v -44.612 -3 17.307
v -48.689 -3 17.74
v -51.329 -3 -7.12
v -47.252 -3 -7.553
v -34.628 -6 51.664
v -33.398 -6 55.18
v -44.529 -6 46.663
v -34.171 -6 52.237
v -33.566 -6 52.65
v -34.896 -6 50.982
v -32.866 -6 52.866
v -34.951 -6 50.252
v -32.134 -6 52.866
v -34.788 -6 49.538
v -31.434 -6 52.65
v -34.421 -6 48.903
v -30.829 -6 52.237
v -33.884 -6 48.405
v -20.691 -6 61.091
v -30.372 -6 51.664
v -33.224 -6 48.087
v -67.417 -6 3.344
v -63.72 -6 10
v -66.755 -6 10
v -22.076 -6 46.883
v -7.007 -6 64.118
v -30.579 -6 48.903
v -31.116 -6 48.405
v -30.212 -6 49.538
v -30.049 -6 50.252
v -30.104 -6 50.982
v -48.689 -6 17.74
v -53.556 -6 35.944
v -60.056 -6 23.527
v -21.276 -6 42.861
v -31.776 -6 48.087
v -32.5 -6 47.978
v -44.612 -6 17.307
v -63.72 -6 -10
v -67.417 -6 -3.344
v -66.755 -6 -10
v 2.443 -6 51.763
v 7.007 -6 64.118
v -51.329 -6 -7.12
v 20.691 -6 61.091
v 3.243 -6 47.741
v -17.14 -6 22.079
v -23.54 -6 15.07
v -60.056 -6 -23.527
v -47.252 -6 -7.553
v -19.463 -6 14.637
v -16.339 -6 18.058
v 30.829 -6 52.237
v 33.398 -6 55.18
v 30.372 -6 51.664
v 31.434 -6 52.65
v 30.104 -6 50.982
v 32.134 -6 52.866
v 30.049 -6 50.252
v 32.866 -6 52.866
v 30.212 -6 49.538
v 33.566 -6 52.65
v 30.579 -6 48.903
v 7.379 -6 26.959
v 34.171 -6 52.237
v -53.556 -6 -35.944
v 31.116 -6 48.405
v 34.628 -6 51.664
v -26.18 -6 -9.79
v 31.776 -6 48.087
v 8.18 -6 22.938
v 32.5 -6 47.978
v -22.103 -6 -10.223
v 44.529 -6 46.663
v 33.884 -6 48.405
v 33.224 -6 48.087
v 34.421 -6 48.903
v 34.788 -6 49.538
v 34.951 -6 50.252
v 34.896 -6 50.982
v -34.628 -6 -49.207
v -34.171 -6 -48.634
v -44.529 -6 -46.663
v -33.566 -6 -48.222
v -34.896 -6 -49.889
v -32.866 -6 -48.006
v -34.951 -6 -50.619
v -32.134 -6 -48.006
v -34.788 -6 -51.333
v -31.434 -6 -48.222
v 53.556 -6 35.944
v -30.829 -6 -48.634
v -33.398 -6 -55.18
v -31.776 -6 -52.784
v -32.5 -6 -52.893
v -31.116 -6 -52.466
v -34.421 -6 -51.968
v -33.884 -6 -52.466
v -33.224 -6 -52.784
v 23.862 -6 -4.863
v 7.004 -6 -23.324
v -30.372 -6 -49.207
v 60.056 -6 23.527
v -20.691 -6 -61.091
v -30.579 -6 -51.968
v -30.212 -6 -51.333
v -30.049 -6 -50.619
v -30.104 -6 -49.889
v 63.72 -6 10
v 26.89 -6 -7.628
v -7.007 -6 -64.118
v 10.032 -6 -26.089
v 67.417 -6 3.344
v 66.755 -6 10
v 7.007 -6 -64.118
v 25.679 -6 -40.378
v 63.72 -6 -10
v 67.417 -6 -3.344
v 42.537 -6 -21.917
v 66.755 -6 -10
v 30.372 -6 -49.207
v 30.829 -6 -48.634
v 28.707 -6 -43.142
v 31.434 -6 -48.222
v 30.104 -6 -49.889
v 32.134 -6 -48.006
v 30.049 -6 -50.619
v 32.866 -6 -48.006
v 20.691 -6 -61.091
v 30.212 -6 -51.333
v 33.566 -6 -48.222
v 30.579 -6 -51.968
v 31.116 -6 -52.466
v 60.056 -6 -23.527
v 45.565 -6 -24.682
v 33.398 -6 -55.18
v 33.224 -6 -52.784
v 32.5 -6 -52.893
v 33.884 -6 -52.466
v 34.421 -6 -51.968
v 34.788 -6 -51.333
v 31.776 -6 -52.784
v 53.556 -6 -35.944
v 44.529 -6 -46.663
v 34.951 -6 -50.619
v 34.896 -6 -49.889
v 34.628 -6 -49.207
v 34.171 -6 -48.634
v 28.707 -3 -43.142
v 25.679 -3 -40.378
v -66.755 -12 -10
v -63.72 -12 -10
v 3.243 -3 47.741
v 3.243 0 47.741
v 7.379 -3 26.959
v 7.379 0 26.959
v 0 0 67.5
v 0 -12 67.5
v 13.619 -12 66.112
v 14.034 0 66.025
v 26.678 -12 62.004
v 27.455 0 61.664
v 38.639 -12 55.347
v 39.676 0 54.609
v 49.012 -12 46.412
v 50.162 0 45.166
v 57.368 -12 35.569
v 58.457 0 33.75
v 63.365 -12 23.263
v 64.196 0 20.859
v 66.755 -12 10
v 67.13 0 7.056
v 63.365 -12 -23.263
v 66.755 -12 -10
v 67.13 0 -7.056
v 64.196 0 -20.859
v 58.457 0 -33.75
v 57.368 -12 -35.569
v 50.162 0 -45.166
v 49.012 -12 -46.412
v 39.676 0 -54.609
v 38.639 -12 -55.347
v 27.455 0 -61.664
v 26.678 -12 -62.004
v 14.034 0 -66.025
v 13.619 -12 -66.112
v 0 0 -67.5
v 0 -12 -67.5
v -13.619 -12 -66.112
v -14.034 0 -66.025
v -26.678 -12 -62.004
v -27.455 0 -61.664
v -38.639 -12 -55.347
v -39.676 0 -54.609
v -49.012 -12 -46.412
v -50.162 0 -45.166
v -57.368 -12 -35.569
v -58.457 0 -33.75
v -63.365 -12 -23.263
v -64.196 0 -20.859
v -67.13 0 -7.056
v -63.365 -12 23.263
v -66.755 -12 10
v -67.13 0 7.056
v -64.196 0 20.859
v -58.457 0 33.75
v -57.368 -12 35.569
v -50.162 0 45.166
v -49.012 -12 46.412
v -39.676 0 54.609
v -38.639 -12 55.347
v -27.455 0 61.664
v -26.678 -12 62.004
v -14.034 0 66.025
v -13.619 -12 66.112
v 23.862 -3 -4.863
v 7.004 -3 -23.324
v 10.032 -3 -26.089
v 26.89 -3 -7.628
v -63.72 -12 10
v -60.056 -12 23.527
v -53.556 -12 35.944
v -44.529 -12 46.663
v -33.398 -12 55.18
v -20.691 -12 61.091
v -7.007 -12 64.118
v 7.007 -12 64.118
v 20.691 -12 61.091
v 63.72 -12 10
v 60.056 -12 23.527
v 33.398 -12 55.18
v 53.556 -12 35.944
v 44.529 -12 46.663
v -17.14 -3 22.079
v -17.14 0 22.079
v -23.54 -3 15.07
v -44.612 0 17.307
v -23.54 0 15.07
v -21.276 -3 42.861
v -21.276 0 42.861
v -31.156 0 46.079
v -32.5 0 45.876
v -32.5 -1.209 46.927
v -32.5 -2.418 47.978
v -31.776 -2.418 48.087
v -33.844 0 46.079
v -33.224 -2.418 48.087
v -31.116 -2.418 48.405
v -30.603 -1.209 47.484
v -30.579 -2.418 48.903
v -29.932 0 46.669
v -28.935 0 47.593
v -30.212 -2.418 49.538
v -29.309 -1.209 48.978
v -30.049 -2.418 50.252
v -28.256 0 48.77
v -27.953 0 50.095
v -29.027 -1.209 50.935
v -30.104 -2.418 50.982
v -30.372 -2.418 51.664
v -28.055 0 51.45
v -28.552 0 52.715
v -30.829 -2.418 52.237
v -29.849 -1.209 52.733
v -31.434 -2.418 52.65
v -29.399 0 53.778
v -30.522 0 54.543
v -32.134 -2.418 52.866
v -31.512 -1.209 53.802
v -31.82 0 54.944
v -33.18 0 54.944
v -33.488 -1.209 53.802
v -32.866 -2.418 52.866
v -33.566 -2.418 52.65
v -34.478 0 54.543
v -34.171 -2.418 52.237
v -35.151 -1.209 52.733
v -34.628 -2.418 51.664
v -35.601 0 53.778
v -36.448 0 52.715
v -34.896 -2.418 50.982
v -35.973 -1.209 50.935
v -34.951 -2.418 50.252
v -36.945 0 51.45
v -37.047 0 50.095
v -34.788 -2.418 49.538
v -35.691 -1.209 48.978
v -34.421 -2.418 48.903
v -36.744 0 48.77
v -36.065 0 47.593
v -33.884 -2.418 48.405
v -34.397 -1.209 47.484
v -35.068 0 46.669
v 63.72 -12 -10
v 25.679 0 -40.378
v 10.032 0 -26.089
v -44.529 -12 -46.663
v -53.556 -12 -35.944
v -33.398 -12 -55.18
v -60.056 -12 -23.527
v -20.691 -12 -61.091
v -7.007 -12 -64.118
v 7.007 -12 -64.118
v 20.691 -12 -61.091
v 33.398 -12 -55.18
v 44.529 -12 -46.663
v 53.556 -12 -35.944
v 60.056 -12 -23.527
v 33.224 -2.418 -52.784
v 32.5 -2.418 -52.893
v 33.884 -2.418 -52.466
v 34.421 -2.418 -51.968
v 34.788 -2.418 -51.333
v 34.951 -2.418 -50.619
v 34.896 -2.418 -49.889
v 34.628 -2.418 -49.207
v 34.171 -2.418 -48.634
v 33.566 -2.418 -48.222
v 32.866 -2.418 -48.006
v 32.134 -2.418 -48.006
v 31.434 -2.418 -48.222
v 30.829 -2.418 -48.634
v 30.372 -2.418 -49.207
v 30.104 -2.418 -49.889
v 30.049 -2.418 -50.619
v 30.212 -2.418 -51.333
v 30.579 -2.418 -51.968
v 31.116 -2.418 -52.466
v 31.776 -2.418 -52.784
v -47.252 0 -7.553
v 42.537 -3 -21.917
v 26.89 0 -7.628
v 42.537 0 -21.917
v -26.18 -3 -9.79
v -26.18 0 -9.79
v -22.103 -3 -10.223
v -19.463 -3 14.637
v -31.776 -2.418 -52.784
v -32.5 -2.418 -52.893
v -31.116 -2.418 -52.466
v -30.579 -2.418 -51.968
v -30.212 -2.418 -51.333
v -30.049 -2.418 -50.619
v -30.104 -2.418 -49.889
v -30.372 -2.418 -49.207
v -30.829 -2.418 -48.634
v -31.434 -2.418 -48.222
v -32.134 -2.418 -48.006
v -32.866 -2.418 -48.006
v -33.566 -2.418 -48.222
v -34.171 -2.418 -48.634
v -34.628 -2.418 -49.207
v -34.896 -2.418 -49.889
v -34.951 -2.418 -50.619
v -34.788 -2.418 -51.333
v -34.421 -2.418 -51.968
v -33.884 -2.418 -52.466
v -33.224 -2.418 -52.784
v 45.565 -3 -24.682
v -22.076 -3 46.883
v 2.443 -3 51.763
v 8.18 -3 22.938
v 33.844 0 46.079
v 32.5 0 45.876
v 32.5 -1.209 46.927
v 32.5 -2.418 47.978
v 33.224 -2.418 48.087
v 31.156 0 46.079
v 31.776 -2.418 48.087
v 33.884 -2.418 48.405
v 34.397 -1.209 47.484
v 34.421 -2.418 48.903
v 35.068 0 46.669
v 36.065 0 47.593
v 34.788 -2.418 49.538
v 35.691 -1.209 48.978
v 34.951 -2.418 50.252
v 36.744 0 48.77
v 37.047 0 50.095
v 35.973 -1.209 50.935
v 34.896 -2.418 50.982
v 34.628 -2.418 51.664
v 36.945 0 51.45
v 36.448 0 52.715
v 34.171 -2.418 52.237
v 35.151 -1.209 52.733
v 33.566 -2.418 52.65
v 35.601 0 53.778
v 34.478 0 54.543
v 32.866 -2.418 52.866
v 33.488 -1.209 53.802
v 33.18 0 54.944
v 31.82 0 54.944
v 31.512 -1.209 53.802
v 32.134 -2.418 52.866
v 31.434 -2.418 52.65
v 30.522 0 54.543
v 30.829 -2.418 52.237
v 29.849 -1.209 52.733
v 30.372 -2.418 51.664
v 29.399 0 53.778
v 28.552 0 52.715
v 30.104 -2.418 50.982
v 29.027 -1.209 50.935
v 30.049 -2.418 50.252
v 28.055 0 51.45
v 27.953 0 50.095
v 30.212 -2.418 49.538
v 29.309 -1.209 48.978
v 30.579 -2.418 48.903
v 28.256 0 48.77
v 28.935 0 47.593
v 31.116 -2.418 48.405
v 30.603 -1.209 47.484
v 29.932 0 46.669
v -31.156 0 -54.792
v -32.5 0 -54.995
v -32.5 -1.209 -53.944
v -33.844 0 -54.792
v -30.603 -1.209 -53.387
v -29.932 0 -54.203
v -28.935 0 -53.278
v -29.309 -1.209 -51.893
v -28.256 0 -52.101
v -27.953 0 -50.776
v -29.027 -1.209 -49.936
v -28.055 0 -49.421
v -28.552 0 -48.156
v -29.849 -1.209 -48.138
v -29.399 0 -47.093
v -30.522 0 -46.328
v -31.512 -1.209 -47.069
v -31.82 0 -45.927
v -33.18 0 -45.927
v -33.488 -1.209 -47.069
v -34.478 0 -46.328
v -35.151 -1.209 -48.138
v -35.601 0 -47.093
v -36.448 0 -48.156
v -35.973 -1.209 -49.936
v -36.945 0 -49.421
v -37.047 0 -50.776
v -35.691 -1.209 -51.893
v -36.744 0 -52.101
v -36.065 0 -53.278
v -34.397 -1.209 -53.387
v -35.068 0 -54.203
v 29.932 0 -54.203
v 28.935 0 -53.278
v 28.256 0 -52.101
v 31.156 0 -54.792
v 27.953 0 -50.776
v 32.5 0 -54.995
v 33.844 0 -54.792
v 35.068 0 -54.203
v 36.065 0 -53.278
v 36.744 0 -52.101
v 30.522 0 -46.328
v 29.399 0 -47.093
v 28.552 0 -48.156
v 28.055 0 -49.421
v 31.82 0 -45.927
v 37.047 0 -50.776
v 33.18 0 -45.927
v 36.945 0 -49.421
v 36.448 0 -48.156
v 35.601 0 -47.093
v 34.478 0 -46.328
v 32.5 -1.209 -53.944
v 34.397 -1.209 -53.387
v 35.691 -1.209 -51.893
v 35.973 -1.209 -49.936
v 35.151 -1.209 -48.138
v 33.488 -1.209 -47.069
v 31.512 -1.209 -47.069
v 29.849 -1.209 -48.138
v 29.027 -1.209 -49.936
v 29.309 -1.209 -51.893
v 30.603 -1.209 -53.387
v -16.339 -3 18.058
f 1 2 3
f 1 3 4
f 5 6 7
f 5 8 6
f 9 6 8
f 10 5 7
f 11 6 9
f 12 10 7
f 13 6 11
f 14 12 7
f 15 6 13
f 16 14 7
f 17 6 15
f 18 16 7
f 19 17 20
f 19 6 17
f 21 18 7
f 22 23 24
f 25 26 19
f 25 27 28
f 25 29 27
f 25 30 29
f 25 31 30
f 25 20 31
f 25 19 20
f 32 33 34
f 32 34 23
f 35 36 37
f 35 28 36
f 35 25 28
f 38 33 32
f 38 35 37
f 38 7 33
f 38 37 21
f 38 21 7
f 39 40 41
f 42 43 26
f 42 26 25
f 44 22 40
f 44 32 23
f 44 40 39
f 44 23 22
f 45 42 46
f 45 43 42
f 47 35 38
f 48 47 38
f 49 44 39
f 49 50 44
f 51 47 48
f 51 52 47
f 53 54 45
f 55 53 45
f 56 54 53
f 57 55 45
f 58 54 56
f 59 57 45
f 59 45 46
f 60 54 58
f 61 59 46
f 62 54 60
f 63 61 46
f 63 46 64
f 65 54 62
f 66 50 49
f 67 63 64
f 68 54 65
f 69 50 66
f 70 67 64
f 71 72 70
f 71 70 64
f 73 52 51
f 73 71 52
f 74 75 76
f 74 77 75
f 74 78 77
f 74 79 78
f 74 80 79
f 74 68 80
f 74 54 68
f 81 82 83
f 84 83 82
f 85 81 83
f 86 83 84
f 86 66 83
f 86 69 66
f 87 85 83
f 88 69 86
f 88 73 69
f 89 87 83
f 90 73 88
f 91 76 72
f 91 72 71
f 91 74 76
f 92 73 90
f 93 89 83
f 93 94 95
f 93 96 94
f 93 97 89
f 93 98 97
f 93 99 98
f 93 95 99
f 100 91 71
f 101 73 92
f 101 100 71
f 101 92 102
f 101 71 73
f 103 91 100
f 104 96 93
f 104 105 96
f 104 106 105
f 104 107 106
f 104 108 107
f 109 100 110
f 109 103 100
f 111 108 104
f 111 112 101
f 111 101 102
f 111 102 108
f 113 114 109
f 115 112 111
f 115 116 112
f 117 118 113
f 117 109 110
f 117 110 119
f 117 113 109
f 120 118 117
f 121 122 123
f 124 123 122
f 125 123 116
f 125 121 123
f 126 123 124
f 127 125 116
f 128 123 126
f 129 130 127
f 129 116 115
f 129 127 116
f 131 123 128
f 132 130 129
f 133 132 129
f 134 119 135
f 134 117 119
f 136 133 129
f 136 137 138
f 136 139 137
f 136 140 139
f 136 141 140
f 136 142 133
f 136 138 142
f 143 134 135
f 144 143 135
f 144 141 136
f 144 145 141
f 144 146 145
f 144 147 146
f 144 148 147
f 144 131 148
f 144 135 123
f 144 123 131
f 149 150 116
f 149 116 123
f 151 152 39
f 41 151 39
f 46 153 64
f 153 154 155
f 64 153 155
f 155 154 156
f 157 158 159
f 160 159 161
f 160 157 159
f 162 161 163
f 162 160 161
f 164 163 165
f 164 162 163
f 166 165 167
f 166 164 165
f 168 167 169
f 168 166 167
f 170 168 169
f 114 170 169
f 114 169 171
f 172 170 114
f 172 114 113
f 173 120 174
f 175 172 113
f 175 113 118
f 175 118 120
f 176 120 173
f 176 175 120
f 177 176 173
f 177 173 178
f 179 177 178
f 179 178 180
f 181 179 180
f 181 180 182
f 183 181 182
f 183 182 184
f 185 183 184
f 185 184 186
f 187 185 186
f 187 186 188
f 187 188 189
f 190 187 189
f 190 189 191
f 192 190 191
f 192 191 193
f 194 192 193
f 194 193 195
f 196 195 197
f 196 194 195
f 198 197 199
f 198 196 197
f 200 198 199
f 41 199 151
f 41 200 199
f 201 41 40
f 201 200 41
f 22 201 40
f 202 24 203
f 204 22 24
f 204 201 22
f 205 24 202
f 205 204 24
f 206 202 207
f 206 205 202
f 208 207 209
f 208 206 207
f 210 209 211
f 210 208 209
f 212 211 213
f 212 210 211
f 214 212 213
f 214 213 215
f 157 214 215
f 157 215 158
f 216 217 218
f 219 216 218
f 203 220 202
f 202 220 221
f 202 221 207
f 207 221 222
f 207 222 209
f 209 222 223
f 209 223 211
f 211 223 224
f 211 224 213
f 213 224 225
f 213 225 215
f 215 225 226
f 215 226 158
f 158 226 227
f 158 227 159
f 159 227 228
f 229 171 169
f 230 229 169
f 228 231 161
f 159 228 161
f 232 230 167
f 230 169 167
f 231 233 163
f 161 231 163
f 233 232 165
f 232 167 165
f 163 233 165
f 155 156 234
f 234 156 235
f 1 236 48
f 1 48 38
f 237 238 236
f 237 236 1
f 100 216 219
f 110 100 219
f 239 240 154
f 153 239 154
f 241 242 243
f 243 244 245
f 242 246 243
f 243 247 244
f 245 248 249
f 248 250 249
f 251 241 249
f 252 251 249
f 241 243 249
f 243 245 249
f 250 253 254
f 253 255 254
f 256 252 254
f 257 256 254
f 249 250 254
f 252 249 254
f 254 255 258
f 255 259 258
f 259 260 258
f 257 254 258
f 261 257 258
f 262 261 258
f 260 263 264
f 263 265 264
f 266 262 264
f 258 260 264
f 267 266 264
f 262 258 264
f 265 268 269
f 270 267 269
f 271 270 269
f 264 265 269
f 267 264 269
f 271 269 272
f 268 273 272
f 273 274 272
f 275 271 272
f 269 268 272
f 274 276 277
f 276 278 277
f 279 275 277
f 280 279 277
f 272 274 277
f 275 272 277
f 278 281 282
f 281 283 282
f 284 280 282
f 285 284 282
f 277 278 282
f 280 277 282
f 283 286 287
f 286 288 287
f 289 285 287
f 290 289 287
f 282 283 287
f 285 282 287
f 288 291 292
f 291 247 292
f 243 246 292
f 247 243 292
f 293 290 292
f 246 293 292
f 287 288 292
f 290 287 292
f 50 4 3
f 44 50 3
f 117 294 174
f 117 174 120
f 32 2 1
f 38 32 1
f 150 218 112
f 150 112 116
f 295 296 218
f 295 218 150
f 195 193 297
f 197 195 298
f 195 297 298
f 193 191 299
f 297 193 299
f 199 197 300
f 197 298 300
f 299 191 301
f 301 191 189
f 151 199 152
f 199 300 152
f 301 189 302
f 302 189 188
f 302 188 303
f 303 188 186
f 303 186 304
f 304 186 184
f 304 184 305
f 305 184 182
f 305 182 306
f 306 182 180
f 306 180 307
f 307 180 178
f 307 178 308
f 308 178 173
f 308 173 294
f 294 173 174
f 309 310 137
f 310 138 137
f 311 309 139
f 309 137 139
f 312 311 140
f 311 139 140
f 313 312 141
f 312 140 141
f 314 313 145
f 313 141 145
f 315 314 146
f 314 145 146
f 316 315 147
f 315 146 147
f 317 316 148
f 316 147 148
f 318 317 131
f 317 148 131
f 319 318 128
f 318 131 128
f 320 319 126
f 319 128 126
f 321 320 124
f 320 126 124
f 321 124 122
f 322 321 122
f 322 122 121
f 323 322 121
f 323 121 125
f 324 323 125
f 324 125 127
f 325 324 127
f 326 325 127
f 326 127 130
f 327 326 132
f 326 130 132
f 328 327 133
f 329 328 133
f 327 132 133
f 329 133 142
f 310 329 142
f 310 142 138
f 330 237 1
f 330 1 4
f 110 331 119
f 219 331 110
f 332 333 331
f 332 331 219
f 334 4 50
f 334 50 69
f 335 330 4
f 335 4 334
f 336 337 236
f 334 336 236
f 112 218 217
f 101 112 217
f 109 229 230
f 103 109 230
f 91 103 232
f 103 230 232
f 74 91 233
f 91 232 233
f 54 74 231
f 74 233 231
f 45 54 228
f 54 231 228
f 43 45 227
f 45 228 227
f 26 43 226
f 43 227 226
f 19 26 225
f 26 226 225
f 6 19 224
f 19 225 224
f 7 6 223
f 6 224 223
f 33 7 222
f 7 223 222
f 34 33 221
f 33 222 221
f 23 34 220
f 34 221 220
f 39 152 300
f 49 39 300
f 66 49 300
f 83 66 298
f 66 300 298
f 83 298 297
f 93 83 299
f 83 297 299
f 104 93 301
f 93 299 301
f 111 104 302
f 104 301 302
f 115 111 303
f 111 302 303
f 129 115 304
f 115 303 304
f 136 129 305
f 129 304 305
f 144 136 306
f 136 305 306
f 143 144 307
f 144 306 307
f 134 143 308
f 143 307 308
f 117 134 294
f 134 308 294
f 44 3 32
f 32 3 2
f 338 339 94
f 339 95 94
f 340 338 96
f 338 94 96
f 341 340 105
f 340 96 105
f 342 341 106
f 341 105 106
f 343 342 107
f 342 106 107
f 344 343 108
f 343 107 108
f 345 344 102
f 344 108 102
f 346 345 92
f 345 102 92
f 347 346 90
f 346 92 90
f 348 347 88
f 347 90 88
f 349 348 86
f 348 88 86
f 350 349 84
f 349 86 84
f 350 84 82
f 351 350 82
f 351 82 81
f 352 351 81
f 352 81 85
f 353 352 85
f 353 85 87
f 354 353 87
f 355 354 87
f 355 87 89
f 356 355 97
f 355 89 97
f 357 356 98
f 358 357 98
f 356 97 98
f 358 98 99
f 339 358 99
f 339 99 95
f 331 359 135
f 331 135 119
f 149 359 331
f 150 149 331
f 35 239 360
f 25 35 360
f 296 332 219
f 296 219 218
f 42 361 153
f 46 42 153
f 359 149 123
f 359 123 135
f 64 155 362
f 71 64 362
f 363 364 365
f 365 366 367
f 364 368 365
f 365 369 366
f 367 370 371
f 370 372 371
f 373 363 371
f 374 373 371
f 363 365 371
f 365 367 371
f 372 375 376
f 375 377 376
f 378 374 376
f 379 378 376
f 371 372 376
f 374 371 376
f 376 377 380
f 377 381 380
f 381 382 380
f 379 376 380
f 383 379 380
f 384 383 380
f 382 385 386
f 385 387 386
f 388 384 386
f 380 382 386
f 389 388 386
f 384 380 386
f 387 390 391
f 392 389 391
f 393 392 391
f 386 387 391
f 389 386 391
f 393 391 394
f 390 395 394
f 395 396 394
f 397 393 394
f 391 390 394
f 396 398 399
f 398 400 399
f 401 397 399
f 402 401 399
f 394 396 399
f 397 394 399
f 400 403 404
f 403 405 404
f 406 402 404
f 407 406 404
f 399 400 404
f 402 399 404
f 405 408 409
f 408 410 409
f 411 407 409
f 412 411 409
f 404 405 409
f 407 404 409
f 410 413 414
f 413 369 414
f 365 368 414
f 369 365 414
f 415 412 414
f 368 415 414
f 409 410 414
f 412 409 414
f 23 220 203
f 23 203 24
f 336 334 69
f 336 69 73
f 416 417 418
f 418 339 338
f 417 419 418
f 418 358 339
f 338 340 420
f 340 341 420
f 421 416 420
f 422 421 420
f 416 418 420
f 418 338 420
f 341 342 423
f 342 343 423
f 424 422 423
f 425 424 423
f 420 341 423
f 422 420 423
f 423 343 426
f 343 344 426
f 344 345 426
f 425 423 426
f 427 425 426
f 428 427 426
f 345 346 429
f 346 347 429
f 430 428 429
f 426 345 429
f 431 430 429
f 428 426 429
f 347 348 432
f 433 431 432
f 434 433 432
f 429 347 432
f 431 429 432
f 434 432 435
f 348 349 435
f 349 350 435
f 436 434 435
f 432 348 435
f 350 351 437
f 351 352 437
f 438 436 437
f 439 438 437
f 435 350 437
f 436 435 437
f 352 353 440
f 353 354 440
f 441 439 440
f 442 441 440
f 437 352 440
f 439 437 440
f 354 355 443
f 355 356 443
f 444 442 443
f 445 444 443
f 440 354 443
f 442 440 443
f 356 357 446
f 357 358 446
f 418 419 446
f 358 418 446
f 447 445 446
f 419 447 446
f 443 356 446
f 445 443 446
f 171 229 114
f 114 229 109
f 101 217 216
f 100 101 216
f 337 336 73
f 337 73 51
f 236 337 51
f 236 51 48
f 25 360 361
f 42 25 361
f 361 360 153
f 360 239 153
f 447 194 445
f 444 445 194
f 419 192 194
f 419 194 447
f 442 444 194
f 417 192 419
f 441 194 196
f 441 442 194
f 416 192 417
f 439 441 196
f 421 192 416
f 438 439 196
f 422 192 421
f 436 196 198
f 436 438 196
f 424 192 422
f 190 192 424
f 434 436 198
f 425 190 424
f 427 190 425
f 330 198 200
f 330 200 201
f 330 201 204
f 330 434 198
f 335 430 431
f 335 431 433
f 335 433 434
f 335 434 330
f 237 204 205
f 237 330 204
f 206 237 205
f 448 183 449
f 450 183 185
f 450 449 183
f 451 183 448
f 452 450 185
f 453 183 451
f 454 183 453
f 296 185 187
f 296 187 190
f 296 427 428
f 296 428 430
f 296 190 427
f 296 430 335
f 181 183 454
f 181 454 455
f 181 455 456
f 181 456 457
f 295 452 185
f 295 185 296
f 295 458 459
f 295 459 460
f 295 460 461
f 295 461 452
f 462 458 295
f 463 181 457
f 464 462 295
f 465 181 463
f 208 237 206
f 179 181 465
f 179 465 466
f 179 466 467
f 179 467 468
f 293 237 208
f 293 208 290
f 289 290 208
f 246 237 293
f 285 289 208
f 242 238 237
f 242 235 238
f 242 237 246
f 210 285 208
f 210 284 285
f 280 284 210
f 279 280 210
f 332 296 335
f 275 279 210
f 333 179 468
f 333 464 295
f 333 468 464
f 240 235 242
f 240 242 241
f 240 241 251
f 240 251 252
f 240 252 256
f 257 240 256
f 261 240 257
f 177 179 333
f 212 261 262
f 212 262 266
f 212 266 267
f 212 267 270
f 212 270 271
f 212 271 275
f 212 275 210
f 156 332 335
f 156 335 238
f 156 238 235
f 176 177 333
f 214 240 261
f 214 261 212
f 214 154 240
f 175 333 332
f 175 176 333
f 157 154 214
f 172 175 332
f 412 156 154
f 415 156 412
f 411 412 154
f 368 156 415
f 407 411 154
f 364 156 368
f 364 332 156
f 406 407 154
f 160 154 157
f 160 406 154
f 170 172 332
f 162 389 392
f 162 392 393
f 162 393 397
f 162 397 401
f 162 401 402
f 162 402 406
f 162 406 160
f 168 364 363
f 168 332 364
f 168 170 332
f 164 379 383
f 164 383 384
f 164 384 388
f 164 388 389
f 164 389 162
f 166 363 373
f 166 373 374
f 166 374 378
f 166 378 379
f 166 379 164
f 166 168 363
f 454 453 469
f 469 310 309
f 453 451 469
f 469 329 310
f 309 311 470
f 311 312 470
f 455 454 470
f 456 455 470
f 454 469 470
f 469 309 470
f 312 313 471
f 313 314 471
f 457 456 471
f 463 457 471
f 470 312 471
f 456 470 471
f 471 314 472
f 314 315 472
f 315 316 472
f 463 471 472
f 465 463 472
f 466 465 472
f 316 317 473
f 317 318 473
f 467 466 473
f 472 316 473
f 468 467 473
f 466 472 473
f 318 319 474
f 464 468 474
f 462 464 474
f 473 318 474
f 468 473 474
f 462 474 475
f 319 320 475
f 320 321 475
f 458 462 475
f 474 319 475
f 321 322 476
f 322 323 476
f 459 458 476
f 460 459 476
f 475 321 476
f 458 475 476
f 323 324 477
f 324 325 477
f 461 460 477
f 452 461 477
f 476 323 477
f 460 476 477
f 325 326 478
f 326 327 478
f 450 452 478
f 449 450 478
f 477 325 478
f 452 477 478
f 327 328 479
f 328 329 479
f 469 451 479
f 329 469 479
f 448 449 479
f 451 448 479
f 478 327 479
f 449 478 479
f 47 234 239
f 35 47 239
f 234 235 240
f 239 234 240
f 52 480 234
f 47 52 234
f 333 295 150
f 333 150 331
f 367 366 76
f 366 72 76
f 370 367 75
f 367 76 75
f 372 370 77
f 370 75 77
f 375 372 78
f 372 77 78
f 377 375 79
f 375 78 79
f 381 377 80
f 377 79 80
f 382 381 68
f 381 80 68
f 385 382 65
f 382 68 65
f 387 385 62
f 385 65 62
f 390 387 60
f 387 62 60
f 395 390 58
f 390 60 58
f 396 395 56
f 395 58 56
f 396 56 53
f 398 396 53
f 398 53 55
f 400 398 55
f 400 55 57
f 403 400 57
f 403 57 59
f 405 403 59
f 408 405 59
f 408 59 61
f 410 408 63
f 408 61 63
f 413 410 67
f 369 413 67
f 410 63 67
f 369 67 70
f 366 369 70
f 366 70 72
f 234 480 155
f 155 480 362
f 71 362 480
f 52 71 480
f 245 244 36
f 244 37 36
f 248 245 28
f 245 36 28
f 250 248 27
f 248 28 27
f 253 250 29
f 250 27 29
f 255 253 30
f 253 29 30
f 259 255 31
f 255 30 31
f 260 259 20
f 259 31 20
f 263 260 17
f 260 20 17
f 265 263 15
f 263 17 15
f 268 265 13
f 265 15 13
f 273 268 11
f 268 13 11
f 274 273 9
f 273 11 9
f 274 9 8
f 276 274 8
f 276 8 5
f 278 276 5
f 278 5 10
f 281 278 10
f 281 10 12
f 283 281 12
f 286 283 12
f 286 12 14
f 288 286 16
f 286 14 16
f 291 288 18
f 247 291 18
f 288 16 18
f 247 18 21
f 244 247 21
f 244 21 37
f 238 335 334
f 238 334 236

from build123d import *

# Parameters (mm, degrees)
SKETCH2_R                                         = 67.5
PALM_BASE_DEPTH                                   = 12
BOTTOM_SURFACE_REMOVED_T                          = -6
THROUGH_HOLE_FOR_FINGER_BASE_REACH                = 98.211
FINGER_BASE_CUT_OFFSET_FROM_SURFACE_REACH         = 101.211
FINGER_START                                      = -3
SKETCH4_R                                         = 64.5
SIDE_THICKNESS_CUT_DEPTH                          = 6
CSK_FOR_8_FLAT_HEAD_SOCKET_CAP_SCREW1_D           = 4.9149
CSK_FOR_8_FLAT_HEAD_SOCKET_CAP_SCREW1_CSINK_D     = 9.1186
CSK_FOR_8_FLAT_HEAD_SOCKET_CAP_SCREW1_CSINK_ANGLE = 82
SLOT_FOR_PALM_BOTTOM_REACH                        = 98.211
SLOT_FOR_PALM_BOTTOM_END_RADIUS                   = 67.5
SKETCH9_W                                         = 20
SKETCH9_H                                         = 6
SLOT_FOR_PALM_BOTTOM_DIRECTION_2_REACH            = 98.211
SLOT_FOR_PALM_BOTTOM_DIRECTION_2_END_RADIUS       = 67.5


with BuildPart() as part:
    # Sketch2 → Palm base (new body)
    with BuildSketch(Plane(origin=(0, 0, 0), x_dir=(1, 0, 0), z_dir=(0, 1, 0))):
        with Locations(Location((0, 0, 0), (0, 0, 270))):
            Circle(SKETCH2_R)
    extrude(amount=-PALM_BASE_DEPTH)

    # Bottom surface removed
    bottom_surface_removed_openings = [part.faces().sort_by_distance(p)[0] for p in [
        (0, -12, 0),
    ]]
    offset(amount=BOTTOM_SURFACE_REMOVED_T, openings=bottom_surface_removed_openings, kind=Kind.INTERSECTION)

    # Sketch3 → Through hole for finger base (cut, up to next)
    with BuildSketch(Plane(origin=(0, 0, 0), x_dir=(1, 0, 0), z_dir=(0, 1, 0)), mode=Mode.PRIVATE) as through_hole_for_finger_base_sk1:
        Polygon((25.678953914, 40.377684751), (42.53720785, 21.916935194), (26.889876526, 7.627879157), (10.031622589, 26.088628715), align=None)
    through_hole_for_finger_base_tool1 = extrude(through_hole_for_finger_base_sk1.sketch, amount=-THROUGH_HOLE_FOR_FINGER_BASE_REACH, mode=Mode.PRIVATE) & part.part
    # Sketch3 → Through hole for finger base (cut, up to next)
    with BuildSketch(Plane(origin=(0, 0, 0), x_dir=(1, 0, 0), z_dir=(0, 1, 0)), mode=Mode.PRIVATE) as through_hole_for_finger_base_sk2:
        Polygon((7.379432661, -26.959116707), (-17.139633769, -22.079016153), (-21.276006998, -42.861376859), (3.243059431, -47.741477412), align=None)
    through_hole_for_finger_base_tool2 = extrude(through_hole_for_finger_base_sk2.sketch, amount=-THROUGH_HOLE_FOR_FINGER_BASE_REACH, mode=Mode.PRIVATE) & part.part
    # Sketch3 → Through hole for finger base (cut, up to next)
    with BuildSketch(Plane(origin=(0, 0, 0), x_dir=(1, 0, 0), z_dir=(0, 1, 0)), mode=Mode.PRIVATE) as through_hole_for_finger_base_sk3:
        Polygon((-26.18008314, 9.790467137), (-23.540423594, -15.06978623), (-44.611974348, -17.307161662), (-47.251633894, 7.553091705), align=None)
    through_hole_for_finger_base_tool3 = extrude(through_hole_for_finger_base_sk3.sketch, amount=-THROUGH_HOLE_FOR_FINGER_BASE_REACH, mode=Mode.PRIVATE) & part.part
    add(through_hole_for_finger_base_tool1.solids().sort_by_distance((26.284415, 0, -24.002782))[0], mode=Mode.SUBTRACT)
    add(through_hole_for_finger_base_tool2.solids().sort_by_distance((-6.948287, 0, 34.910247))[0], mode=Mode.SUBTRACT)
    add(through_hole_for_finger_base_tool3.solids().sort_by_distance((-35.396029, 0, 3.758347))[0], mode=Mode.SUBTRACT)

    # Sketch7 → Finger base cut offset from surface (cut, up to next)
    with BuildSketch(Plane(origin=(0, 0, 0), x_dir=(1, 0, 0), z_dir=(0, 1, 0)).offset(FINGER_START), mode=Mode.PRIVATE) as finger_base_cut_offset_from_surface_sk1:
        Polygon((8.179769152, -22.937989812), (-16.339297278, -18.057889258), (-17.139633769, -22.079016153), (7.379432661, -26.959116707), align=None)
    finger_base_cut_offset_from_surface_tool1 = extrude(finger_base_cut_offset_from_surface_sk1.sketch, amount=-FINGER_BASE_CUT_OFFSET_FROM_SURFACE_REACH, mode=Mode.PRIVATE) & part.part
    # Sketch7 → Finger base cut offset from surface (cut, up to next)
    with BuildSketch(Plane(origin=(0, 0, 0), x_dir=(1, 0, 0), z_dir=(0, 1, 0)).offset(FINGER_START), mode=Mode.PRIVATE) as finger_base_cut_offset_from_surface_sk2:
        Polygon((-22.076343489, -46.882503753), (2.442722941, -51.762604307), (3.243059431, -47.741477412), (-21.276006998, -42.861376859), align=None)
    finger_base_cut_offset_from_surface_tool2 = extrude(finger_base_cut_offset_from_surface_sk2.sketch, amount=-FINGER_BASE_CUT_OFFSET_FROM_SURFACE_REACH, mode=Mode.PRIVATE) & part.part
    # Sketch7 → Finger base cut offset from surface (cut, up to next)
    with BuildSketch(Plane(origin=(0, 0, 0), x_dir=(1, 0, 0), z_dir=(0, 1, 0)).offset(FINGER_START), mode=Mode.PRIVATE) as finger_base_cut_offset_from_surface_sk3:
        Polygon((10.031622589, 26.088628715), (7.004059662, 23.323875069), (23.862313598, 4.863125512), (26.889876526, 7.627879157), align=None)
    finger_base_cut_offset_from_surface_tool3 = extrude(finger_base_cut_offset_from_surface_sk3.sketch, amount=-FINGER_BASE_CUT_OFFSET_FROM_SURFACE_REACH, mode=Mode.PRIVATE) & part.part
    # Sketch7 → Finger base cut offset from surface (cut, up to next)
    with BuildSketch(Plane(origin=(0, 0, 0), x_dir=(1, 0, 0), z_dir=(0, 1, 0)).offset(FINGER_START), mode=Mode.PRIVATE) as finger_base_cut_offset_from_surface_sk4:
        Polygon((45.564770778, 24.681688839), (42.53720785, 21.916935194), (25.678953914, 40.377684751), (28.706516842, 43.142438397), align=None)
    finger_base_cut_offset_from_surface_tool4 = extrude(finger_base_cut_offset_from_surface_sk4.sketch, amount=-FINGER_BASE_CUT_OFFSET_FROM_SURFACE_REACH, mode=Mode.PRIVATE) & part.part
    # Sketch7 → Finger base cut offset from surface (cut, up to next)
    with BuildSketch(Plane(origin=(0, 0, 0), x_dir=(1, 0, 0), z_dir=(0, 1, 0)).offset(FINGER_START), mode=Mode.PRIVATE) as finger_base_cut_offset_from_surface_sk5:
        Polygon((-48.6890559, -17.740065828), (-44.611974348, -17.307161662), (-47.251633894, 7.553091705), (-51.328715447, 7.120187539), align=None)
    finger_base_cut_offset_from_surface_tool5 = extrude(finger_base_cut_offset_from_surface_sk5.sketch, amount=-FINGER_BASE_CUT_OFFSET_FROM_SURFACE_REACH, mode=Mode.PRIVATE) & part.part
    # Sketch7 → Finger base cut offset from surface (cut, up to next)
    with BuildSketch(Plane(origin=(0, 0, 0), x_dir=(1, 0, 0), z_dir=(0, 1, 0)).offset(FINGER_START), mode=Mode.PRIVATE) as finger_base_cut_offset_from_surface_sk6:
        Polygon((-23.540423594, -15.06978623), (-26.18008314, 9.790467137), (-22.103001588, 10.223371302), (-19.463342042, -14.636882065), align=None)
    finger_base_cut_offset_from_surface_tool6 = extrude(finger_base_cut_offset_from_surface_sk6.sketch, amount=-FINGER_BASE_CUT_OFFSET_FROM_SURFACE_REACH, mode=Mode.PRIVATE) & part.part
    add(finger_base_cut_offset_from_surface_tool1.solids().sort_by_distance((-4.479932, -3, 22.508503))[0], mode=Mode.SUBTRACT)
    add(finger_base_cut_offset_from_surface_tool2.solids().sort_by_distance((-9.416642, -3, 47.311991))[0], mode=Mode.SUBTRACT)
    add(finger_base_cut_offset_from_surface_tool3.solids().sort_by_distance((16.946968, -3, -15.475877))[0], mode=Mode.SUBTRACT)
    add(finger_base_cut_offset_from_surface_tool4.solids().sort_by_distance((35.621862, -3, -32.529687))[0], mode=Mode.SUBTRACT)
    add(finger_base_cut_offset_from_surface_tool5.solids().sort_by_distance((-47.970345, -3, 5.093487))[0], mode=Mode.SUBTRACT)
    add(finger_base_cut_offset_from_surface_tool6.solids().sort_by_distance((-22.821713, -3, 2.423207))[0], mode=Mode.SUBTRACT)

    # Sketch4 → Side thickness cut (cut)
    with BuildSketch(Plane.XZ.offset(12)):
        with Locations(Location((0, 0, 0), (0, 0, 270))):
            Circle(SKETCH4_R)
    extrude(amount=-SIDE_THICKNESS_CUT_DEPTH, mode=Mode.SUBTRACT)

    # CSK for #8 Flat Head Socket Cap Screw1 (through all)
    with Locations(Plane(origin=(-32.5, 0, -50.435602505), x_dir=(0, 0, 1), z_dir=(0, 1, 0))):
        with Locations((0, 0), (0, 65), (100.87120501, 65), (100.87120501, 0)):
            CounterSinkHole(CSK_FOR_8_FLAT_HEAD_SOCKET_CAP_SCREW1_D / 2, CSK_FOR_8_FLAT_HEAD_SOCKET_CAP_SCREW1_CSINK_D / 2, counter_sink_angle=CSK_FOR_8_FLAT_HEAD_SOCKET_CAP_SCREW1_CSINK_ANGLE)

    # Slot for palm bottom: up to this cylinder (the profile starts inside it)
    slot_for_palm_bottom_end = Plane(origin=(0, -9, 0), z_dir=(0, 1, 0)) * Cylinder(SLOT_FOR_PALM_BOTTOM_END_RADIUS, 332.422, mode=Mode.PRIVATE)
    # Sketch9 → Slot for palm bottom (cut, up to the surface)
    with BuildSketch(Plane(origin=(0, 0, 0), x_dir=(0, 0, -1), z_dir=(1, 0, 0)), mode=Mode.PRIVATE) as slot_for_palm_bottom_sk1:
        with Locations((0, -9)):
            Rectangle(SKETCH9_W, SKETCH9_H)
    slot_for_palm_bottom_tool1 = extrude(slot_for_palm_bottom_sk1.sketch, amount=-SLOT_FOR_PALM_BOTTOM_REACH, mode=Mode.PRIVATE) & slot_for_palm_bottom_end
    add(slot_for_palm_bottom_tool1.solids().sort_by_distance((0, -9, 0))[0], mode=Mode.SUBTRACT)

    # Slot for palm bottom direction 2: up to this cylinder (the profile starts inside it)
    slot_for_palm_bottom_direction_2_end = Plane(origin=(0, -9, 0), z_dir=(0, 1, 0)) * Cylinder(SLOT_FOR_PALM_BOTTOM_DIRECTION_2_END_RADIUS, 332.422, mode=Mode.PRIVATE)
    # Sketch9 → Slot for palm bottom direction 2 (cut, up to the surface)
    with BuildSketch(Plane(origin=(0, 0, 0), x_dir=(0, 0, -1), z_dir=(1, 0, 0)), mode=Mode.PRIVATE) as slot_for_palm_bottom_direction_2_sk1:
        with Locations((0, -9)):
            Rectangle(SKETCH9_W, SKETCH9_H)
    slot_for_palm_bottom_direction_2_tool1 = extrude(slot_for_palm_bottom_direction_2_sk1.sketch, amount=SLOT_FOR_PALM_BOTTOM_DIRECTION_2_REACH, mode=Mode.PRIVATE) & slot_for_palm_bottom_direction_2_end
    add(slot_for_palm_bottom_direction_2_tool1.solids().sort_by_distance((0, -9, 0))[0], mode=Mode.SUBTRACT)


solid = part.part
